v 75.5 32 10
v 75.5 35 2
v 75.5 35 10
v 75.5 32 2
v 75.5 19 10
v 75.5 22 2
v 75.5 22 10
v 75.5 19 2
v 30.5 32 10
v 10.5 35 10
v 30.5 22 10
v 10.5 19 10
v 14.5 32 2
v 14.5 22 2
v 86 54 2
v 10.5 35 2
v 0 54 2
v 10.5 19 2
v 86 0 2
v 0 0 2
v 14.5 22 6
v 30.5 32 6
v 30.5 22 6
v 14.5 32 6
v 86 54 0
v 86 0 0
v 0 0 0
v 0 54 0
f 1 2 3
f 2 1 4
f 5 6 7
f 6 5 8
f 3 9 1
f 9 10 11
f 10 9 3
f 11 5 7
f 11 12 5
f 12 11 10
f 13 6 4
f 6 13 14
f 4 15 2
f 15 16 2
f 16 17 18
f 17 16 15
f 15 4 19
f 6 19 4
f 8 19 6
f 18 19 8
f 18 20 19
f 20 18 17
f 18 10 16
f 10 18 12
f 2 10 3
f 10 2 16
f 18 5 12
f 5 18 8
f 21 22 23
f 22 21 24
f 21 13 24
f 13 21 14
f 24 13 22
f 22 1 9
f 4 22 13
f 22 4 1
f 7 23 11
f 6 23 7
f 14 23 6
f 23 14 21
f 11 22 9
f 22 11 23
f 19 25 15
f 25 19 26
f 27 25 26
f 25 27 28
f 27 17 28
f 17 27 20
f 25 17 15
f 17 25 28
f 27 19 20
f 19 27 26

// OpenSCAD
 cube([86,54,2]);

translate([(86-65)/2,(54-16)/2,2])
difference() {
    cube([65,16,8]);
    
    translate([4,3,-.5])
        cube([65,10,4.5]);
    translate([20,3,1])
    cube([65,10,8.5]);
}
